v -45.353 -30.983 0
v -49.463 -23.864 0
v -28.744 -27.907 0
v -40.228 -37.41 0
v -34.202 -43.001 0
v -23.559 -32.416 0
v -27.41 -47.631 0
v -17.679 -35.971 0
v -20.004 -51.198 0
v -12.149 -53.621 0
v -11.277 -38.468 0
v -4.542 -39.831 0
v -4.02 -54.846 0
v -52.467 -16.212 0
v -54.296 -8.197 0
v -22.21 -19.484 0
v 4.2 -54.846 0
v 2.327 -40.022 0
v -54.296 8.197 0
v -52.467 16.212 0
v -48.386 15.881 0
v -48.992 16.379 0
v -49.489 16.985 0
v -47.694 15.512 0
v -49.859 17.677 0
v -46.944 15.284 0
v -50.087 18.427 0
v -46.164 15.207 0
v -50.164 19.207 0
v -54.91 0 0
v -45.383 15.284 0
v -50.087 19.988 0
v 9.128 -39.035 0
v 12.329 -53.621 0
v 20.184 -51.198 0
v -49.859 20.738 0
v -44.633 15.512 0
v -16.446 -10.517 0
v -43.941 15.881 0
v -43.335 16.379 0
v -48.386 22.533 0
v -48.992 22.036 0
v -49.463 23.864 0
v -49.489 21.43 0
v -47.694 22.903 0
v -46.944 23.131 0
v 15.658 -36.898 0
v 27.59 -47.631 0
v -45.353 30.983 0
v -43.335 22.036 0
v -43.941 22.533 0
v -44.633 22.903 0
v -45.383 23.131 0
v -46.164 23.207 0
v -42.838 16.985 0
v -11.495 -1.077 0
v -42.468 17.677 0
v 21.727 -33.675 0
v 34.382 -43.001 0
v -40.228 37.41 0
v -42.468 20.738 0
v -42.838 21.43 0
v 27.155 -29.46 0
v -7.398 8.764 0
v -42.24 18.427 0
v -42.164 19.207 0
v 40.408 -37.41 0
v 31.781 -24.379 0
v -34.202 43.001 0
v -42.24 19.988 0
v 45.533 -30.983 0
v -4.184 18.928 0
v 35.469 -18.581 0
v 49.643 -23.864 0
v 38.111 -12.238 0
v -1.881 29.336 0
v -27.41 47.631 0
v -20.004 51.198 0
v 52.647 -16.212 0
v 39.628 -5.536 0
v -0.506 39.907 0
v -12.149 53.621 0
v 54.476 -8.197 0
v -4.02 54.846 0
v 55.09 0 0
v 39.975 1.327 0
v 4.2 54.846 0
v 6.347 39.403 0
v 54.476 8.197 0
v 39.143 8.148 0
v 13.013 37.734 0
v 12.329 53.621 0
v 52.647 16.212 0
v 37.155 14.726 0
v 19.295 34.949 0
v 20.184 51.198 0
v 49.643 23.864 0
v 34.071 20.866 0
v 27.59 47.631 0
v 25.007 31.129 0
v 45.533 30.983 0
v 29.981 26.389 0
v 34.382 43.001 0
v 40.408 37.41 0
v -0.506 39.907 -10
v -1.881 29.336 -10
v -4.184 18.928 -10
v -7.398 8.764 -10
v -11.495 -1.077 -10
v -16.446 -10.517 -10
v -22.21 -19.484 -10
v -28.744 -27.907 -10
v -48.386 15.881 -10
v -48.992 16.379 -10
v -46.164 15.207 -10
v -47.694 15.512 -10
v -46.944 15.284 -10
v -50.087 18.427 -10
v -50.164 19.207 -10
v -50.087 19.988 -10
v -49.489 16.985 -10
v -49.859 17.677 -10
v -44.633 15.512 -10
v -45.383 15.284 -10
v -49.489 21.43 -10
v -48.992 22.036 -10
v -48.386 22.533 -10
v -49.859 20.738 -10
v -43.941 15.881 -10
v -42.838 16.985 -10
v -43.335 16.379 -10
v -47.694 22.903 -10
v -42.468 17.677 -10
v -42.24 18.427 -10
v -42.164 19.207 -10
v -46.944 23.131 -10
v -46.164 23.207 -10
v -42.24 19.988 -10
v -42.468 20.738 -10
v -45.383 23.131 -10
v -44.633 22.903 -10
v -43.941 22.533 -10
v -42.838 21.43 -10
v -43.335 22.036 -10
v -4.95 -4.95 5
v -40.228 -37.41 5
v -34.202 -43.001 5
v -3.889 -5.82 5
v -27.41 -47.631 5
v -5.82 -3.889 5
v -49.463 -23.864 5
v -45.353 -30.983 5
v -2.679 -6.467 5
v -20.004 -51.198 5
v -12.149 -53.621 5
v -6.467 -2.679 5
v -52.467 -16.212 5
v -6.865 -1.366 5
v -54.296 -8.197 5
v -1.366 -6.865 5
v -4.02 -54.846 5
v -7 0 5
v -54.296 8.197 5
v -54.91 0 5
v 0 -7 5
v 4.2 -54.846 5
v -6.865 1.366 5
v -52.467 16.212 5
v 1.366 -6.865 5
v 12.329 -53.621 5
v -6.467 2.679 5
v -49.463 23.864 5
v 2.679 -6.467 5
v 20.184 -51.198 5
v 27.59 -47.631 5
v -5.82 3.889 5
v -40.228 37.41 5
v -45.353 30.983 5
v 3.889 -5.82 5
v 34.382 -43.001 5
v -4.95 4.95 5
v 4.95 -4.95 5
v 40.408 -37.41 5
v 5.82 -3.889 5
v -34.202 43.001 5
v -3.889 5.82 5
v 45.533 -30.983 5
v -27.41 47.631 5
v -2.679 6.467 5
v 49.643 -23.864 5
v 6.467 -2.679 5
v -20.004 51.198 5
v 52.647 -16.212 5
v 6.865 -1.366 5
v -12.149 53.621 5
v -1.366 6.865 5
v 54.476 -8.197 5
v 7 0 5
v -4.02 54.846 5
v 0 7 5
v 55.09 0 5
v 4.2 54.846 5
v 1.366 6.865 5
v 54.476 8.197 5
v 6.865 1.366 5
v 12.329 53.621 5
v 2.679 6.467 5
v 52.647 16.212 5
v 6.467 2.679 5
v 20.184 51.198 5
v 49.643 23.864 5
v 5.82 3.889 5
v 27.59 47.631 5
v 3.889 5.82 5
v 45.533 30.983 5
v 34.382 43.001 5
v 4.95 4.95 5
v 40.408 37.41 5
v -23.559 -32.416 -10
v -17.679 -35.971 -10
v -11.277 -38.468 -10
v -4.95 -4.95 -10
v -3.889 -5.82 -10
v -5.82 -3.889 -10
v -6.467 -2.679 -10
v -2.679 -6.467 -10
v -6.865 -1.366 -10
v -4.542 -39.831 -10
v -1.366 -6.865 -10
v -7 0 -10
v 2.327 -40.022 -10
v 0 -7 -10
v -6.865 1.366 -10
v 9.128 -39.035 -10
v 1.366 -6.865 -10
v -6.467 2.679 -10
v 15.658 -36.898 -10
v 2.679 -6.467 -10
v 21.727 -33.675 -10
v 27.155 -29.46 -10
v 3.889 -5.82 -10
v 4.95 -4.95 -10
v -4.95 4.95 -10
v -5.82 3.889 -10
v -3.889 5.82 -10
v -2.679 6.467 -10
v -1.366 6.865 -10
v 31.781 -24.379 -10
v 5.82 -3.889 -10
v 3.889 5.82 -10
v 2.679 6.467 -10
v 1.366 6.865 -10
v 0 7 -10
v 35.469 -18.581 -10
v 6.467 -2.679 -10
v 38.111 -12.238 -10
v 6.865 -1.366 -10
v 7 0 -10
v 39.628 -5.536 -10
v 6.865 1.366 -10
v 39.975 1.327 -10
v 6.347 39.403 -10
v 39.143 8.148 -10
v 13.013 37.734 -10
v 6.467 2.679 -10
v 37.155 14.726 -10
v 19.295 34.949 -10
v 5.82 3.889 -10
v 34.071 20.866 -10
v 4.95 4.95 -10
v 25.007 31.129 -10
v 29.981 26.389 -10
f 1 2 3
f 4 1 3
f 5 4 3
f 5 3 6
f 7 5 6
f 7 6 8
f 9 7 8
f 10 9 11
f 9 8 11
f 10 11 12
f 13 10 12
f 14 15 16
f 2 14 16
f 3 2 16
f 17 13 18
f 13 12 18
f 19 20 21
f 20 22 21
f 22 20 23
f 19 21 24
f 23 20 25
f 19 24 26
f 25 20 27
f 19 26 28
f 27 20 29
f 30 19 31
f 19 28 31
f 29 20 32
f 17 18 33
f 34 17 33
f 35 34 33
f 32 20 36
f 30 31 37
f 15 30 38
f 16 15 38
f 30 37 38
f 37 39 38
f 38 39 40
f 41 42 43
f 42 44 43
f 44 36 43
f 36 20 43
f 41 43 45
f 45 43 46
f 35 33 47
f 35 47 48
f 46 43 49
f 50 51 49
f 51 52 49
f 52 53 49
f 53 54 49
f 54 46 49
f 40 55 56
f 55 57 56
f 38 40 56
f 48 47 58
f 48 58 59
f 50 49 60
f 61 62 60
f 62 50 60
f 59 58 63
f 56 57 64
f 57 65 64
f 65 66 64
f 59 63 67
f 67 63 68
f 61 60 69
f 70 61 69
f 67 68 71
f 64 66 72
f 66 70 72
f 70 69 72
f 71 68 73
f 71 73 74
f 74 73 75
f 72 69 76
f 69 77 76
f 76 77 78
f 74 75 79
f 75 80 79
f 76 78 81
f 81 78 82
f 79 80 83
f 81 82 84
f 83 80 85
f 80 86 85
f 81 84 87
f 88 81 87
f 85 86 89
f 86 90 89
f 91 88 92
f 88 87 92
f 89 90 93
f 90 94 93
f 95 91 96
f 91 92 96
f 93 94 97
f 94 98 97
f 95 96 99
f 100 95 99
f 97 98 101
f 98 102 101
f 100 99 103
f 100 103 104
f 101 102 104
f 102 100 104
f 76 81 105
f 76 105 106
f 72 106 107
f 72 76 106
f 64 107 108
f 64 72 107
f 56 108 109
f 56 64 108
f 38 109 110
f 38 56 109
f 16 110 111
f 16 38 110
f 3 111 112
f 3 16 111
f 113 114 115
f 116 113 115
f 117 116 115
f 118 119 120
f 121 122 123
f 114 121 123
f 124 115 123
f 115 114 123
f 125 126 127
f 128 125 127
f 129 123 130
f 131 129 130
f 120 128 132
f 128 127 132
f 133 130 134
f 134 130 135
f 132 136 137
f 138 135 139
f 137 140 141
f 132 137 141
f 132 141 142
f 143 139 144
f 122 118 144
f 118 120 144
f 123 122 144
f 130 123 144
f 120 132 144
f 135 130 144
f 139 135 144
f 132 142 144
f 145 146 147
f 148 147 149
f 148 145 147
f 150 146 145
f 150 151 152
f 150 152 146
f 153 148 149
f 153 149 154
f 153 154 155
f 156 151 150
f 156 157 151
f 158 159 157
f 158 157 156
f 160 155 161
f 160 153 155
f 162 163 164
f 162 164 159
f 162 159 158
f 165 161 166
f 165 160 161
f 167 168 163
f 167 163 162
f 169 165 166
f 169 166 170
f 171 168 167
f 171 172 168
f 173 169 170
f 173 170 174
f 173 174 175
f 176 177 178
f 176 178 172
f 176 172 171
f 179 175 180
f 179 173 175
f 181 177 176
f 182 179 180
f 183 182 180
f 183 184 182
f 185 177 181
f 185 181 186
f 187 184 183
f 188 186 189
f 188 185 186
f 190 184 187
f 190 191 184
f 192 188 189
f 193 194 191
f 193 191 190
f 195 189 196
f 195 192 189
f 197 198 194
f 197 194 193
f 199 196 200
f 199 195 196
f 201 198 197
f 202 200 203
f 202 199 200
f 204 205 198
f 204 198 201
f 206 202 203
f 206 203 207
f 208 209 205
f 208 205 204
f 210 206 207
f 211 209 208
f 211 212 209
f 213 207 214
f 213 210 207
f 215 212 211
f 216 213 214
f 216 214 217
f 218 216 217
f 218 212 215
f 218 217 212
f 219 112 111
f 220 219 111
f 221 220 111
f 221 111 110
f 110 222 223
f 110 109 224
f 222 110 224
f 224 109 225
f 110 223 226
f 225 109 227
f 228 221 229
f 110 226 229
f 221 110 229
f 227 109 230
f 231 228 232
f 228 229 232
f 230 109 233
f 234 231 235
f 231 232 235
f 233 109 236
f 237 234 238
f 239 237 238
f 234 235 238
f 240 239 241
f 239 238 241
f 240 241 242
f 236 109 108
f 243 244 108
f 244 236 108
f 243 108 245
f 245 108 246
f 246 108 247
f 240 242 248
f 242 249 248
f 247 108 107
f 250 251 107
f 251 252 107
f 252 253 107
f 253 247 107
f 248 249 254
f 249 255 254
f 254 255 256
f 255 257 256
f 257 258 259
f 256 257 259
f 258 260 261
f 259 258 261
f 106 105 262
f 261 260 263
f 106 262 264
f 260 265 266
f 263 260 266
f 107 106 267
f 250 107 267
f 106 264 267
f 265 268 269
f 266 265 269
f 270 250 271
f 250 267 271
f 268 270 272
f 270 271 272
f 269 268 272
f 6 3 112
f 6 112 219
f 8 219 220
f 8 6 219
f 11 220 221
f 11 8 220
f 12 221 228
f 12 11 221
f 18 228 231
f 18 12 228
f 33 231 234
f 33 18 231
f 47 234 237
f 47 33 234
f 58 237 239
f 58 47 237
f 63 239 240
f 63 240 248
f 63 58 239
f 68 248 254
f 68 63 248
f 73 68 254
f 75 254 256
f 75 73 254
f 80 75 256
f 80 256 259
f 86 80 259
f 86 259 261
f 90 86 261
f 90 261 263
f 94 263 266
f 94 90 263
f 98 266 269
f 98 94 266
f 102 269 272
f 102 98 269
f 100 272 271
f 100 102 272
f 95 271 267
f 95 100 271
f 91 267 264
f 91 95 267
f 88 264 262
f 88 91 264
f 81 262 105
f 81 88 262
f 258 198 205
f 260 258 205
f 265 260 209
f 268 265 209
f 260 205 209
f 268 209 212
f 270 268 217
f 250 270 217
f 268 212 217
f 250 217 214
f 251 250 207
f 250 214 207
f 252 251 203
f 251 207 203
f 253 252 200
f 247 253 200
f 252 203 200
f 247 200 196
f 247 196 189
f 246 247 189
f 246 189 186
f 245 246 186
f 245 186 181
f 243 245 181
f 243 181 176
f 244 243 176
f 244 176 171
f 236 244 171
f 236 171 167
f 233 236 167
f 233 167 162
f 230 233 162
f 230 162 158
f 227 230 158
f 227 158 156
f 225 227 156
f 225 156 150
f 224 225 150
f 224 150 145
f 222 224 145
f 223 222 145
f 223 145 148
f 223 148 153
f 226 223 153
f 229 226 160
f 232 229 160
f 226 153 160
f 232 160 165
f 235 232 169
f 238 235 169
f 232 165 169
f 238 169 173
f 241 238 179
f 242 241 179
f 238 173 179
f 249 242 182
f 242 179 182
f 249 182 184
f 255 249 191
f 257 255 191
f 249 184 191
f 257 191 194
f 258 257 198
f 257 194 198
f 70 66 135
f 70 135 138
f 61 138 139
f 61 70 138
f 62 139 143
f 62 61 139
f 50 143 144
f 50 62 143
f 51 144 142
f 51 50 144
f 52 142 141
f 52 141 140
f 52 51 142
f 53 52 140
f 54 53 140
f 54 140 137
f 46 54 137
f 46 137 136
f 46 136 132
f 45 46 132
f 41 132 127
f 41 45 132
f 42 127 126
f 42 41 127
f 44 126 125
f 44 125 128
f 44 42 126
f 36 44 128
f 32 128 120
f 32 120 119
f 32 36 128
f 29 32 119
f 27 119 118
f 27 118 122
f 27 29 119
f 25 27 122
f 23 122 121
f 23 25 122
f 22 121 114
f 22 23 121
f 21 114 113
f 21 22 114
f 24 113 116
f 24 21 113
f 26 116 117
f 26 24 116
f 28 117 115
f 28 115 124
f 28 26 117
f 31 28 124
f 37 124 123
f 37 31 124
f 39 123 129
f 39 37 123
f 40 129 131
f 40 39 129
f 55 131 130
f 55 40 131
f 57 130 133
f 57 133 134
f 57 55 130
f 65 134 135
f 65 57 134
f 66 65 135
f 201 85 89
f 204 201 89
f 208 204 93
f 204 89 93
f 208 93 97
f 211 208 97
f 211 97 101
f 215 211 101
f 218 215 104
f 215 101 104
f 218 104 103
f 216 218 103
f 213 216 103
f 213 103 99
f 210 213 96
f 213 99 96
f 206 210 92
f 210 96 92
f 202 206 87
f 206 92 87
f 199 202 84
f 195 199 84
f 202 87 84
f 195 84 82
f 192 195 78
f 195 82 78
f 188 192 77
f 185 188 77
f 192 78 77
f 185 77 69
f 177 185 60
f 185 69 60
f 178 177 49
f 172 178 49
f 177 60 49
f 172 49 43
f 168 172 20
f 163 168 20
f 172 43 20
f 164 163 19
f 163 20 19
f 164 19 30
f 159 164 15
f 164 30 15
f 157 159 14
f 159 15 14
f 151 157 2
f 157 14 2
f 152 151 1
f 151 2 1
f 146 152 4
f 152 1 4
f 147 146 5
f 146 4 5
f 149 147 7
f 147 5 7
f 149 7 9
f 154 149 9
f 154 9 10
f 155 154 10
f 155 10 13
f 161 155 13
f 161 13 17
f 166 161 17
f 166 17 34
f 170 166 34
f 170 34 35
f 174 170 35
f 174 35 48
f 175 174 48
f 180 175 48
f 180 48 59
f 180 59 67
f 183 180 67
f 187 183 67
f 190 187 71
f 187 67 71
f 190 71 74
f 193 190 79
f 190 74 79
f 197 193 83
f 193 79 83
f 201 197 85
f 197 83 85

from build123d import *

# Parameters (mm, degrees)
SKETCH1_R             = 4
BOSS_EXTRUDE1_DEPTH   = 10
BOSS_EXTRUDE1_2_DEPTH = 10
SKETCH1_3_R           = 55
BOSS_EXTRUDE2_DEPTH   = 5
SKETCH2_R             = 7
CUT_EXTRUDE1_DEPTH    = 80.277412294


with BuildPart() as part:
    # Sketch1 → Boss-Extrude1 (new body)
    with BuildSketch(Plane.XY):
        with Locations((-46.163581641, 19.207370937)):
            Circle(SKETCH1_R)
    extrude(amount=-BOSS_EXTRUDE1_DEPTH)



with BuildPart() as body_2:
    # Sketch1 → Boss-Extrude1 2 (new body)
    with BuildSketch(Plane.XY):
        with BuildLine():
            ThreePointArc((-28.744125942, -27.906815487), (36.926456917, -15.466500887), (-0.505940955, 39.906800169))
            ThreePointArc((-0.505940955, 39.906800169), (-9.337651898, 3.798280238), (-28.744125942, -27.906815487))
        make_face()
    extrude(amount=-BOSS_EXTRUDE1_2_DEPTH)


with BuildPart() as part_1:
    add(part.part)

    add(body_2.part)  # Boss-Extrude2 merges body 2
    # Sketch1<3> → Boss-Extrude2 (add)
    with BuildSketch(Plane.XY):
        with Locations((0.09, 0)):
            Circle(SKETCH1_3_R)
    extrude(amount=BOSS_EXTRUDE2_DEPTH)

    # Sketch2 → Cut-Extrude1 (cut, through all)
    with BuildSketch(Plane.XY.offset(5)):
        Circle(SKETCH2_R)
    extrude(amount=-CUT_EXTRUDE1_DEPTH, mode=Mode.SUBTRACT)


solid = part_1.part
